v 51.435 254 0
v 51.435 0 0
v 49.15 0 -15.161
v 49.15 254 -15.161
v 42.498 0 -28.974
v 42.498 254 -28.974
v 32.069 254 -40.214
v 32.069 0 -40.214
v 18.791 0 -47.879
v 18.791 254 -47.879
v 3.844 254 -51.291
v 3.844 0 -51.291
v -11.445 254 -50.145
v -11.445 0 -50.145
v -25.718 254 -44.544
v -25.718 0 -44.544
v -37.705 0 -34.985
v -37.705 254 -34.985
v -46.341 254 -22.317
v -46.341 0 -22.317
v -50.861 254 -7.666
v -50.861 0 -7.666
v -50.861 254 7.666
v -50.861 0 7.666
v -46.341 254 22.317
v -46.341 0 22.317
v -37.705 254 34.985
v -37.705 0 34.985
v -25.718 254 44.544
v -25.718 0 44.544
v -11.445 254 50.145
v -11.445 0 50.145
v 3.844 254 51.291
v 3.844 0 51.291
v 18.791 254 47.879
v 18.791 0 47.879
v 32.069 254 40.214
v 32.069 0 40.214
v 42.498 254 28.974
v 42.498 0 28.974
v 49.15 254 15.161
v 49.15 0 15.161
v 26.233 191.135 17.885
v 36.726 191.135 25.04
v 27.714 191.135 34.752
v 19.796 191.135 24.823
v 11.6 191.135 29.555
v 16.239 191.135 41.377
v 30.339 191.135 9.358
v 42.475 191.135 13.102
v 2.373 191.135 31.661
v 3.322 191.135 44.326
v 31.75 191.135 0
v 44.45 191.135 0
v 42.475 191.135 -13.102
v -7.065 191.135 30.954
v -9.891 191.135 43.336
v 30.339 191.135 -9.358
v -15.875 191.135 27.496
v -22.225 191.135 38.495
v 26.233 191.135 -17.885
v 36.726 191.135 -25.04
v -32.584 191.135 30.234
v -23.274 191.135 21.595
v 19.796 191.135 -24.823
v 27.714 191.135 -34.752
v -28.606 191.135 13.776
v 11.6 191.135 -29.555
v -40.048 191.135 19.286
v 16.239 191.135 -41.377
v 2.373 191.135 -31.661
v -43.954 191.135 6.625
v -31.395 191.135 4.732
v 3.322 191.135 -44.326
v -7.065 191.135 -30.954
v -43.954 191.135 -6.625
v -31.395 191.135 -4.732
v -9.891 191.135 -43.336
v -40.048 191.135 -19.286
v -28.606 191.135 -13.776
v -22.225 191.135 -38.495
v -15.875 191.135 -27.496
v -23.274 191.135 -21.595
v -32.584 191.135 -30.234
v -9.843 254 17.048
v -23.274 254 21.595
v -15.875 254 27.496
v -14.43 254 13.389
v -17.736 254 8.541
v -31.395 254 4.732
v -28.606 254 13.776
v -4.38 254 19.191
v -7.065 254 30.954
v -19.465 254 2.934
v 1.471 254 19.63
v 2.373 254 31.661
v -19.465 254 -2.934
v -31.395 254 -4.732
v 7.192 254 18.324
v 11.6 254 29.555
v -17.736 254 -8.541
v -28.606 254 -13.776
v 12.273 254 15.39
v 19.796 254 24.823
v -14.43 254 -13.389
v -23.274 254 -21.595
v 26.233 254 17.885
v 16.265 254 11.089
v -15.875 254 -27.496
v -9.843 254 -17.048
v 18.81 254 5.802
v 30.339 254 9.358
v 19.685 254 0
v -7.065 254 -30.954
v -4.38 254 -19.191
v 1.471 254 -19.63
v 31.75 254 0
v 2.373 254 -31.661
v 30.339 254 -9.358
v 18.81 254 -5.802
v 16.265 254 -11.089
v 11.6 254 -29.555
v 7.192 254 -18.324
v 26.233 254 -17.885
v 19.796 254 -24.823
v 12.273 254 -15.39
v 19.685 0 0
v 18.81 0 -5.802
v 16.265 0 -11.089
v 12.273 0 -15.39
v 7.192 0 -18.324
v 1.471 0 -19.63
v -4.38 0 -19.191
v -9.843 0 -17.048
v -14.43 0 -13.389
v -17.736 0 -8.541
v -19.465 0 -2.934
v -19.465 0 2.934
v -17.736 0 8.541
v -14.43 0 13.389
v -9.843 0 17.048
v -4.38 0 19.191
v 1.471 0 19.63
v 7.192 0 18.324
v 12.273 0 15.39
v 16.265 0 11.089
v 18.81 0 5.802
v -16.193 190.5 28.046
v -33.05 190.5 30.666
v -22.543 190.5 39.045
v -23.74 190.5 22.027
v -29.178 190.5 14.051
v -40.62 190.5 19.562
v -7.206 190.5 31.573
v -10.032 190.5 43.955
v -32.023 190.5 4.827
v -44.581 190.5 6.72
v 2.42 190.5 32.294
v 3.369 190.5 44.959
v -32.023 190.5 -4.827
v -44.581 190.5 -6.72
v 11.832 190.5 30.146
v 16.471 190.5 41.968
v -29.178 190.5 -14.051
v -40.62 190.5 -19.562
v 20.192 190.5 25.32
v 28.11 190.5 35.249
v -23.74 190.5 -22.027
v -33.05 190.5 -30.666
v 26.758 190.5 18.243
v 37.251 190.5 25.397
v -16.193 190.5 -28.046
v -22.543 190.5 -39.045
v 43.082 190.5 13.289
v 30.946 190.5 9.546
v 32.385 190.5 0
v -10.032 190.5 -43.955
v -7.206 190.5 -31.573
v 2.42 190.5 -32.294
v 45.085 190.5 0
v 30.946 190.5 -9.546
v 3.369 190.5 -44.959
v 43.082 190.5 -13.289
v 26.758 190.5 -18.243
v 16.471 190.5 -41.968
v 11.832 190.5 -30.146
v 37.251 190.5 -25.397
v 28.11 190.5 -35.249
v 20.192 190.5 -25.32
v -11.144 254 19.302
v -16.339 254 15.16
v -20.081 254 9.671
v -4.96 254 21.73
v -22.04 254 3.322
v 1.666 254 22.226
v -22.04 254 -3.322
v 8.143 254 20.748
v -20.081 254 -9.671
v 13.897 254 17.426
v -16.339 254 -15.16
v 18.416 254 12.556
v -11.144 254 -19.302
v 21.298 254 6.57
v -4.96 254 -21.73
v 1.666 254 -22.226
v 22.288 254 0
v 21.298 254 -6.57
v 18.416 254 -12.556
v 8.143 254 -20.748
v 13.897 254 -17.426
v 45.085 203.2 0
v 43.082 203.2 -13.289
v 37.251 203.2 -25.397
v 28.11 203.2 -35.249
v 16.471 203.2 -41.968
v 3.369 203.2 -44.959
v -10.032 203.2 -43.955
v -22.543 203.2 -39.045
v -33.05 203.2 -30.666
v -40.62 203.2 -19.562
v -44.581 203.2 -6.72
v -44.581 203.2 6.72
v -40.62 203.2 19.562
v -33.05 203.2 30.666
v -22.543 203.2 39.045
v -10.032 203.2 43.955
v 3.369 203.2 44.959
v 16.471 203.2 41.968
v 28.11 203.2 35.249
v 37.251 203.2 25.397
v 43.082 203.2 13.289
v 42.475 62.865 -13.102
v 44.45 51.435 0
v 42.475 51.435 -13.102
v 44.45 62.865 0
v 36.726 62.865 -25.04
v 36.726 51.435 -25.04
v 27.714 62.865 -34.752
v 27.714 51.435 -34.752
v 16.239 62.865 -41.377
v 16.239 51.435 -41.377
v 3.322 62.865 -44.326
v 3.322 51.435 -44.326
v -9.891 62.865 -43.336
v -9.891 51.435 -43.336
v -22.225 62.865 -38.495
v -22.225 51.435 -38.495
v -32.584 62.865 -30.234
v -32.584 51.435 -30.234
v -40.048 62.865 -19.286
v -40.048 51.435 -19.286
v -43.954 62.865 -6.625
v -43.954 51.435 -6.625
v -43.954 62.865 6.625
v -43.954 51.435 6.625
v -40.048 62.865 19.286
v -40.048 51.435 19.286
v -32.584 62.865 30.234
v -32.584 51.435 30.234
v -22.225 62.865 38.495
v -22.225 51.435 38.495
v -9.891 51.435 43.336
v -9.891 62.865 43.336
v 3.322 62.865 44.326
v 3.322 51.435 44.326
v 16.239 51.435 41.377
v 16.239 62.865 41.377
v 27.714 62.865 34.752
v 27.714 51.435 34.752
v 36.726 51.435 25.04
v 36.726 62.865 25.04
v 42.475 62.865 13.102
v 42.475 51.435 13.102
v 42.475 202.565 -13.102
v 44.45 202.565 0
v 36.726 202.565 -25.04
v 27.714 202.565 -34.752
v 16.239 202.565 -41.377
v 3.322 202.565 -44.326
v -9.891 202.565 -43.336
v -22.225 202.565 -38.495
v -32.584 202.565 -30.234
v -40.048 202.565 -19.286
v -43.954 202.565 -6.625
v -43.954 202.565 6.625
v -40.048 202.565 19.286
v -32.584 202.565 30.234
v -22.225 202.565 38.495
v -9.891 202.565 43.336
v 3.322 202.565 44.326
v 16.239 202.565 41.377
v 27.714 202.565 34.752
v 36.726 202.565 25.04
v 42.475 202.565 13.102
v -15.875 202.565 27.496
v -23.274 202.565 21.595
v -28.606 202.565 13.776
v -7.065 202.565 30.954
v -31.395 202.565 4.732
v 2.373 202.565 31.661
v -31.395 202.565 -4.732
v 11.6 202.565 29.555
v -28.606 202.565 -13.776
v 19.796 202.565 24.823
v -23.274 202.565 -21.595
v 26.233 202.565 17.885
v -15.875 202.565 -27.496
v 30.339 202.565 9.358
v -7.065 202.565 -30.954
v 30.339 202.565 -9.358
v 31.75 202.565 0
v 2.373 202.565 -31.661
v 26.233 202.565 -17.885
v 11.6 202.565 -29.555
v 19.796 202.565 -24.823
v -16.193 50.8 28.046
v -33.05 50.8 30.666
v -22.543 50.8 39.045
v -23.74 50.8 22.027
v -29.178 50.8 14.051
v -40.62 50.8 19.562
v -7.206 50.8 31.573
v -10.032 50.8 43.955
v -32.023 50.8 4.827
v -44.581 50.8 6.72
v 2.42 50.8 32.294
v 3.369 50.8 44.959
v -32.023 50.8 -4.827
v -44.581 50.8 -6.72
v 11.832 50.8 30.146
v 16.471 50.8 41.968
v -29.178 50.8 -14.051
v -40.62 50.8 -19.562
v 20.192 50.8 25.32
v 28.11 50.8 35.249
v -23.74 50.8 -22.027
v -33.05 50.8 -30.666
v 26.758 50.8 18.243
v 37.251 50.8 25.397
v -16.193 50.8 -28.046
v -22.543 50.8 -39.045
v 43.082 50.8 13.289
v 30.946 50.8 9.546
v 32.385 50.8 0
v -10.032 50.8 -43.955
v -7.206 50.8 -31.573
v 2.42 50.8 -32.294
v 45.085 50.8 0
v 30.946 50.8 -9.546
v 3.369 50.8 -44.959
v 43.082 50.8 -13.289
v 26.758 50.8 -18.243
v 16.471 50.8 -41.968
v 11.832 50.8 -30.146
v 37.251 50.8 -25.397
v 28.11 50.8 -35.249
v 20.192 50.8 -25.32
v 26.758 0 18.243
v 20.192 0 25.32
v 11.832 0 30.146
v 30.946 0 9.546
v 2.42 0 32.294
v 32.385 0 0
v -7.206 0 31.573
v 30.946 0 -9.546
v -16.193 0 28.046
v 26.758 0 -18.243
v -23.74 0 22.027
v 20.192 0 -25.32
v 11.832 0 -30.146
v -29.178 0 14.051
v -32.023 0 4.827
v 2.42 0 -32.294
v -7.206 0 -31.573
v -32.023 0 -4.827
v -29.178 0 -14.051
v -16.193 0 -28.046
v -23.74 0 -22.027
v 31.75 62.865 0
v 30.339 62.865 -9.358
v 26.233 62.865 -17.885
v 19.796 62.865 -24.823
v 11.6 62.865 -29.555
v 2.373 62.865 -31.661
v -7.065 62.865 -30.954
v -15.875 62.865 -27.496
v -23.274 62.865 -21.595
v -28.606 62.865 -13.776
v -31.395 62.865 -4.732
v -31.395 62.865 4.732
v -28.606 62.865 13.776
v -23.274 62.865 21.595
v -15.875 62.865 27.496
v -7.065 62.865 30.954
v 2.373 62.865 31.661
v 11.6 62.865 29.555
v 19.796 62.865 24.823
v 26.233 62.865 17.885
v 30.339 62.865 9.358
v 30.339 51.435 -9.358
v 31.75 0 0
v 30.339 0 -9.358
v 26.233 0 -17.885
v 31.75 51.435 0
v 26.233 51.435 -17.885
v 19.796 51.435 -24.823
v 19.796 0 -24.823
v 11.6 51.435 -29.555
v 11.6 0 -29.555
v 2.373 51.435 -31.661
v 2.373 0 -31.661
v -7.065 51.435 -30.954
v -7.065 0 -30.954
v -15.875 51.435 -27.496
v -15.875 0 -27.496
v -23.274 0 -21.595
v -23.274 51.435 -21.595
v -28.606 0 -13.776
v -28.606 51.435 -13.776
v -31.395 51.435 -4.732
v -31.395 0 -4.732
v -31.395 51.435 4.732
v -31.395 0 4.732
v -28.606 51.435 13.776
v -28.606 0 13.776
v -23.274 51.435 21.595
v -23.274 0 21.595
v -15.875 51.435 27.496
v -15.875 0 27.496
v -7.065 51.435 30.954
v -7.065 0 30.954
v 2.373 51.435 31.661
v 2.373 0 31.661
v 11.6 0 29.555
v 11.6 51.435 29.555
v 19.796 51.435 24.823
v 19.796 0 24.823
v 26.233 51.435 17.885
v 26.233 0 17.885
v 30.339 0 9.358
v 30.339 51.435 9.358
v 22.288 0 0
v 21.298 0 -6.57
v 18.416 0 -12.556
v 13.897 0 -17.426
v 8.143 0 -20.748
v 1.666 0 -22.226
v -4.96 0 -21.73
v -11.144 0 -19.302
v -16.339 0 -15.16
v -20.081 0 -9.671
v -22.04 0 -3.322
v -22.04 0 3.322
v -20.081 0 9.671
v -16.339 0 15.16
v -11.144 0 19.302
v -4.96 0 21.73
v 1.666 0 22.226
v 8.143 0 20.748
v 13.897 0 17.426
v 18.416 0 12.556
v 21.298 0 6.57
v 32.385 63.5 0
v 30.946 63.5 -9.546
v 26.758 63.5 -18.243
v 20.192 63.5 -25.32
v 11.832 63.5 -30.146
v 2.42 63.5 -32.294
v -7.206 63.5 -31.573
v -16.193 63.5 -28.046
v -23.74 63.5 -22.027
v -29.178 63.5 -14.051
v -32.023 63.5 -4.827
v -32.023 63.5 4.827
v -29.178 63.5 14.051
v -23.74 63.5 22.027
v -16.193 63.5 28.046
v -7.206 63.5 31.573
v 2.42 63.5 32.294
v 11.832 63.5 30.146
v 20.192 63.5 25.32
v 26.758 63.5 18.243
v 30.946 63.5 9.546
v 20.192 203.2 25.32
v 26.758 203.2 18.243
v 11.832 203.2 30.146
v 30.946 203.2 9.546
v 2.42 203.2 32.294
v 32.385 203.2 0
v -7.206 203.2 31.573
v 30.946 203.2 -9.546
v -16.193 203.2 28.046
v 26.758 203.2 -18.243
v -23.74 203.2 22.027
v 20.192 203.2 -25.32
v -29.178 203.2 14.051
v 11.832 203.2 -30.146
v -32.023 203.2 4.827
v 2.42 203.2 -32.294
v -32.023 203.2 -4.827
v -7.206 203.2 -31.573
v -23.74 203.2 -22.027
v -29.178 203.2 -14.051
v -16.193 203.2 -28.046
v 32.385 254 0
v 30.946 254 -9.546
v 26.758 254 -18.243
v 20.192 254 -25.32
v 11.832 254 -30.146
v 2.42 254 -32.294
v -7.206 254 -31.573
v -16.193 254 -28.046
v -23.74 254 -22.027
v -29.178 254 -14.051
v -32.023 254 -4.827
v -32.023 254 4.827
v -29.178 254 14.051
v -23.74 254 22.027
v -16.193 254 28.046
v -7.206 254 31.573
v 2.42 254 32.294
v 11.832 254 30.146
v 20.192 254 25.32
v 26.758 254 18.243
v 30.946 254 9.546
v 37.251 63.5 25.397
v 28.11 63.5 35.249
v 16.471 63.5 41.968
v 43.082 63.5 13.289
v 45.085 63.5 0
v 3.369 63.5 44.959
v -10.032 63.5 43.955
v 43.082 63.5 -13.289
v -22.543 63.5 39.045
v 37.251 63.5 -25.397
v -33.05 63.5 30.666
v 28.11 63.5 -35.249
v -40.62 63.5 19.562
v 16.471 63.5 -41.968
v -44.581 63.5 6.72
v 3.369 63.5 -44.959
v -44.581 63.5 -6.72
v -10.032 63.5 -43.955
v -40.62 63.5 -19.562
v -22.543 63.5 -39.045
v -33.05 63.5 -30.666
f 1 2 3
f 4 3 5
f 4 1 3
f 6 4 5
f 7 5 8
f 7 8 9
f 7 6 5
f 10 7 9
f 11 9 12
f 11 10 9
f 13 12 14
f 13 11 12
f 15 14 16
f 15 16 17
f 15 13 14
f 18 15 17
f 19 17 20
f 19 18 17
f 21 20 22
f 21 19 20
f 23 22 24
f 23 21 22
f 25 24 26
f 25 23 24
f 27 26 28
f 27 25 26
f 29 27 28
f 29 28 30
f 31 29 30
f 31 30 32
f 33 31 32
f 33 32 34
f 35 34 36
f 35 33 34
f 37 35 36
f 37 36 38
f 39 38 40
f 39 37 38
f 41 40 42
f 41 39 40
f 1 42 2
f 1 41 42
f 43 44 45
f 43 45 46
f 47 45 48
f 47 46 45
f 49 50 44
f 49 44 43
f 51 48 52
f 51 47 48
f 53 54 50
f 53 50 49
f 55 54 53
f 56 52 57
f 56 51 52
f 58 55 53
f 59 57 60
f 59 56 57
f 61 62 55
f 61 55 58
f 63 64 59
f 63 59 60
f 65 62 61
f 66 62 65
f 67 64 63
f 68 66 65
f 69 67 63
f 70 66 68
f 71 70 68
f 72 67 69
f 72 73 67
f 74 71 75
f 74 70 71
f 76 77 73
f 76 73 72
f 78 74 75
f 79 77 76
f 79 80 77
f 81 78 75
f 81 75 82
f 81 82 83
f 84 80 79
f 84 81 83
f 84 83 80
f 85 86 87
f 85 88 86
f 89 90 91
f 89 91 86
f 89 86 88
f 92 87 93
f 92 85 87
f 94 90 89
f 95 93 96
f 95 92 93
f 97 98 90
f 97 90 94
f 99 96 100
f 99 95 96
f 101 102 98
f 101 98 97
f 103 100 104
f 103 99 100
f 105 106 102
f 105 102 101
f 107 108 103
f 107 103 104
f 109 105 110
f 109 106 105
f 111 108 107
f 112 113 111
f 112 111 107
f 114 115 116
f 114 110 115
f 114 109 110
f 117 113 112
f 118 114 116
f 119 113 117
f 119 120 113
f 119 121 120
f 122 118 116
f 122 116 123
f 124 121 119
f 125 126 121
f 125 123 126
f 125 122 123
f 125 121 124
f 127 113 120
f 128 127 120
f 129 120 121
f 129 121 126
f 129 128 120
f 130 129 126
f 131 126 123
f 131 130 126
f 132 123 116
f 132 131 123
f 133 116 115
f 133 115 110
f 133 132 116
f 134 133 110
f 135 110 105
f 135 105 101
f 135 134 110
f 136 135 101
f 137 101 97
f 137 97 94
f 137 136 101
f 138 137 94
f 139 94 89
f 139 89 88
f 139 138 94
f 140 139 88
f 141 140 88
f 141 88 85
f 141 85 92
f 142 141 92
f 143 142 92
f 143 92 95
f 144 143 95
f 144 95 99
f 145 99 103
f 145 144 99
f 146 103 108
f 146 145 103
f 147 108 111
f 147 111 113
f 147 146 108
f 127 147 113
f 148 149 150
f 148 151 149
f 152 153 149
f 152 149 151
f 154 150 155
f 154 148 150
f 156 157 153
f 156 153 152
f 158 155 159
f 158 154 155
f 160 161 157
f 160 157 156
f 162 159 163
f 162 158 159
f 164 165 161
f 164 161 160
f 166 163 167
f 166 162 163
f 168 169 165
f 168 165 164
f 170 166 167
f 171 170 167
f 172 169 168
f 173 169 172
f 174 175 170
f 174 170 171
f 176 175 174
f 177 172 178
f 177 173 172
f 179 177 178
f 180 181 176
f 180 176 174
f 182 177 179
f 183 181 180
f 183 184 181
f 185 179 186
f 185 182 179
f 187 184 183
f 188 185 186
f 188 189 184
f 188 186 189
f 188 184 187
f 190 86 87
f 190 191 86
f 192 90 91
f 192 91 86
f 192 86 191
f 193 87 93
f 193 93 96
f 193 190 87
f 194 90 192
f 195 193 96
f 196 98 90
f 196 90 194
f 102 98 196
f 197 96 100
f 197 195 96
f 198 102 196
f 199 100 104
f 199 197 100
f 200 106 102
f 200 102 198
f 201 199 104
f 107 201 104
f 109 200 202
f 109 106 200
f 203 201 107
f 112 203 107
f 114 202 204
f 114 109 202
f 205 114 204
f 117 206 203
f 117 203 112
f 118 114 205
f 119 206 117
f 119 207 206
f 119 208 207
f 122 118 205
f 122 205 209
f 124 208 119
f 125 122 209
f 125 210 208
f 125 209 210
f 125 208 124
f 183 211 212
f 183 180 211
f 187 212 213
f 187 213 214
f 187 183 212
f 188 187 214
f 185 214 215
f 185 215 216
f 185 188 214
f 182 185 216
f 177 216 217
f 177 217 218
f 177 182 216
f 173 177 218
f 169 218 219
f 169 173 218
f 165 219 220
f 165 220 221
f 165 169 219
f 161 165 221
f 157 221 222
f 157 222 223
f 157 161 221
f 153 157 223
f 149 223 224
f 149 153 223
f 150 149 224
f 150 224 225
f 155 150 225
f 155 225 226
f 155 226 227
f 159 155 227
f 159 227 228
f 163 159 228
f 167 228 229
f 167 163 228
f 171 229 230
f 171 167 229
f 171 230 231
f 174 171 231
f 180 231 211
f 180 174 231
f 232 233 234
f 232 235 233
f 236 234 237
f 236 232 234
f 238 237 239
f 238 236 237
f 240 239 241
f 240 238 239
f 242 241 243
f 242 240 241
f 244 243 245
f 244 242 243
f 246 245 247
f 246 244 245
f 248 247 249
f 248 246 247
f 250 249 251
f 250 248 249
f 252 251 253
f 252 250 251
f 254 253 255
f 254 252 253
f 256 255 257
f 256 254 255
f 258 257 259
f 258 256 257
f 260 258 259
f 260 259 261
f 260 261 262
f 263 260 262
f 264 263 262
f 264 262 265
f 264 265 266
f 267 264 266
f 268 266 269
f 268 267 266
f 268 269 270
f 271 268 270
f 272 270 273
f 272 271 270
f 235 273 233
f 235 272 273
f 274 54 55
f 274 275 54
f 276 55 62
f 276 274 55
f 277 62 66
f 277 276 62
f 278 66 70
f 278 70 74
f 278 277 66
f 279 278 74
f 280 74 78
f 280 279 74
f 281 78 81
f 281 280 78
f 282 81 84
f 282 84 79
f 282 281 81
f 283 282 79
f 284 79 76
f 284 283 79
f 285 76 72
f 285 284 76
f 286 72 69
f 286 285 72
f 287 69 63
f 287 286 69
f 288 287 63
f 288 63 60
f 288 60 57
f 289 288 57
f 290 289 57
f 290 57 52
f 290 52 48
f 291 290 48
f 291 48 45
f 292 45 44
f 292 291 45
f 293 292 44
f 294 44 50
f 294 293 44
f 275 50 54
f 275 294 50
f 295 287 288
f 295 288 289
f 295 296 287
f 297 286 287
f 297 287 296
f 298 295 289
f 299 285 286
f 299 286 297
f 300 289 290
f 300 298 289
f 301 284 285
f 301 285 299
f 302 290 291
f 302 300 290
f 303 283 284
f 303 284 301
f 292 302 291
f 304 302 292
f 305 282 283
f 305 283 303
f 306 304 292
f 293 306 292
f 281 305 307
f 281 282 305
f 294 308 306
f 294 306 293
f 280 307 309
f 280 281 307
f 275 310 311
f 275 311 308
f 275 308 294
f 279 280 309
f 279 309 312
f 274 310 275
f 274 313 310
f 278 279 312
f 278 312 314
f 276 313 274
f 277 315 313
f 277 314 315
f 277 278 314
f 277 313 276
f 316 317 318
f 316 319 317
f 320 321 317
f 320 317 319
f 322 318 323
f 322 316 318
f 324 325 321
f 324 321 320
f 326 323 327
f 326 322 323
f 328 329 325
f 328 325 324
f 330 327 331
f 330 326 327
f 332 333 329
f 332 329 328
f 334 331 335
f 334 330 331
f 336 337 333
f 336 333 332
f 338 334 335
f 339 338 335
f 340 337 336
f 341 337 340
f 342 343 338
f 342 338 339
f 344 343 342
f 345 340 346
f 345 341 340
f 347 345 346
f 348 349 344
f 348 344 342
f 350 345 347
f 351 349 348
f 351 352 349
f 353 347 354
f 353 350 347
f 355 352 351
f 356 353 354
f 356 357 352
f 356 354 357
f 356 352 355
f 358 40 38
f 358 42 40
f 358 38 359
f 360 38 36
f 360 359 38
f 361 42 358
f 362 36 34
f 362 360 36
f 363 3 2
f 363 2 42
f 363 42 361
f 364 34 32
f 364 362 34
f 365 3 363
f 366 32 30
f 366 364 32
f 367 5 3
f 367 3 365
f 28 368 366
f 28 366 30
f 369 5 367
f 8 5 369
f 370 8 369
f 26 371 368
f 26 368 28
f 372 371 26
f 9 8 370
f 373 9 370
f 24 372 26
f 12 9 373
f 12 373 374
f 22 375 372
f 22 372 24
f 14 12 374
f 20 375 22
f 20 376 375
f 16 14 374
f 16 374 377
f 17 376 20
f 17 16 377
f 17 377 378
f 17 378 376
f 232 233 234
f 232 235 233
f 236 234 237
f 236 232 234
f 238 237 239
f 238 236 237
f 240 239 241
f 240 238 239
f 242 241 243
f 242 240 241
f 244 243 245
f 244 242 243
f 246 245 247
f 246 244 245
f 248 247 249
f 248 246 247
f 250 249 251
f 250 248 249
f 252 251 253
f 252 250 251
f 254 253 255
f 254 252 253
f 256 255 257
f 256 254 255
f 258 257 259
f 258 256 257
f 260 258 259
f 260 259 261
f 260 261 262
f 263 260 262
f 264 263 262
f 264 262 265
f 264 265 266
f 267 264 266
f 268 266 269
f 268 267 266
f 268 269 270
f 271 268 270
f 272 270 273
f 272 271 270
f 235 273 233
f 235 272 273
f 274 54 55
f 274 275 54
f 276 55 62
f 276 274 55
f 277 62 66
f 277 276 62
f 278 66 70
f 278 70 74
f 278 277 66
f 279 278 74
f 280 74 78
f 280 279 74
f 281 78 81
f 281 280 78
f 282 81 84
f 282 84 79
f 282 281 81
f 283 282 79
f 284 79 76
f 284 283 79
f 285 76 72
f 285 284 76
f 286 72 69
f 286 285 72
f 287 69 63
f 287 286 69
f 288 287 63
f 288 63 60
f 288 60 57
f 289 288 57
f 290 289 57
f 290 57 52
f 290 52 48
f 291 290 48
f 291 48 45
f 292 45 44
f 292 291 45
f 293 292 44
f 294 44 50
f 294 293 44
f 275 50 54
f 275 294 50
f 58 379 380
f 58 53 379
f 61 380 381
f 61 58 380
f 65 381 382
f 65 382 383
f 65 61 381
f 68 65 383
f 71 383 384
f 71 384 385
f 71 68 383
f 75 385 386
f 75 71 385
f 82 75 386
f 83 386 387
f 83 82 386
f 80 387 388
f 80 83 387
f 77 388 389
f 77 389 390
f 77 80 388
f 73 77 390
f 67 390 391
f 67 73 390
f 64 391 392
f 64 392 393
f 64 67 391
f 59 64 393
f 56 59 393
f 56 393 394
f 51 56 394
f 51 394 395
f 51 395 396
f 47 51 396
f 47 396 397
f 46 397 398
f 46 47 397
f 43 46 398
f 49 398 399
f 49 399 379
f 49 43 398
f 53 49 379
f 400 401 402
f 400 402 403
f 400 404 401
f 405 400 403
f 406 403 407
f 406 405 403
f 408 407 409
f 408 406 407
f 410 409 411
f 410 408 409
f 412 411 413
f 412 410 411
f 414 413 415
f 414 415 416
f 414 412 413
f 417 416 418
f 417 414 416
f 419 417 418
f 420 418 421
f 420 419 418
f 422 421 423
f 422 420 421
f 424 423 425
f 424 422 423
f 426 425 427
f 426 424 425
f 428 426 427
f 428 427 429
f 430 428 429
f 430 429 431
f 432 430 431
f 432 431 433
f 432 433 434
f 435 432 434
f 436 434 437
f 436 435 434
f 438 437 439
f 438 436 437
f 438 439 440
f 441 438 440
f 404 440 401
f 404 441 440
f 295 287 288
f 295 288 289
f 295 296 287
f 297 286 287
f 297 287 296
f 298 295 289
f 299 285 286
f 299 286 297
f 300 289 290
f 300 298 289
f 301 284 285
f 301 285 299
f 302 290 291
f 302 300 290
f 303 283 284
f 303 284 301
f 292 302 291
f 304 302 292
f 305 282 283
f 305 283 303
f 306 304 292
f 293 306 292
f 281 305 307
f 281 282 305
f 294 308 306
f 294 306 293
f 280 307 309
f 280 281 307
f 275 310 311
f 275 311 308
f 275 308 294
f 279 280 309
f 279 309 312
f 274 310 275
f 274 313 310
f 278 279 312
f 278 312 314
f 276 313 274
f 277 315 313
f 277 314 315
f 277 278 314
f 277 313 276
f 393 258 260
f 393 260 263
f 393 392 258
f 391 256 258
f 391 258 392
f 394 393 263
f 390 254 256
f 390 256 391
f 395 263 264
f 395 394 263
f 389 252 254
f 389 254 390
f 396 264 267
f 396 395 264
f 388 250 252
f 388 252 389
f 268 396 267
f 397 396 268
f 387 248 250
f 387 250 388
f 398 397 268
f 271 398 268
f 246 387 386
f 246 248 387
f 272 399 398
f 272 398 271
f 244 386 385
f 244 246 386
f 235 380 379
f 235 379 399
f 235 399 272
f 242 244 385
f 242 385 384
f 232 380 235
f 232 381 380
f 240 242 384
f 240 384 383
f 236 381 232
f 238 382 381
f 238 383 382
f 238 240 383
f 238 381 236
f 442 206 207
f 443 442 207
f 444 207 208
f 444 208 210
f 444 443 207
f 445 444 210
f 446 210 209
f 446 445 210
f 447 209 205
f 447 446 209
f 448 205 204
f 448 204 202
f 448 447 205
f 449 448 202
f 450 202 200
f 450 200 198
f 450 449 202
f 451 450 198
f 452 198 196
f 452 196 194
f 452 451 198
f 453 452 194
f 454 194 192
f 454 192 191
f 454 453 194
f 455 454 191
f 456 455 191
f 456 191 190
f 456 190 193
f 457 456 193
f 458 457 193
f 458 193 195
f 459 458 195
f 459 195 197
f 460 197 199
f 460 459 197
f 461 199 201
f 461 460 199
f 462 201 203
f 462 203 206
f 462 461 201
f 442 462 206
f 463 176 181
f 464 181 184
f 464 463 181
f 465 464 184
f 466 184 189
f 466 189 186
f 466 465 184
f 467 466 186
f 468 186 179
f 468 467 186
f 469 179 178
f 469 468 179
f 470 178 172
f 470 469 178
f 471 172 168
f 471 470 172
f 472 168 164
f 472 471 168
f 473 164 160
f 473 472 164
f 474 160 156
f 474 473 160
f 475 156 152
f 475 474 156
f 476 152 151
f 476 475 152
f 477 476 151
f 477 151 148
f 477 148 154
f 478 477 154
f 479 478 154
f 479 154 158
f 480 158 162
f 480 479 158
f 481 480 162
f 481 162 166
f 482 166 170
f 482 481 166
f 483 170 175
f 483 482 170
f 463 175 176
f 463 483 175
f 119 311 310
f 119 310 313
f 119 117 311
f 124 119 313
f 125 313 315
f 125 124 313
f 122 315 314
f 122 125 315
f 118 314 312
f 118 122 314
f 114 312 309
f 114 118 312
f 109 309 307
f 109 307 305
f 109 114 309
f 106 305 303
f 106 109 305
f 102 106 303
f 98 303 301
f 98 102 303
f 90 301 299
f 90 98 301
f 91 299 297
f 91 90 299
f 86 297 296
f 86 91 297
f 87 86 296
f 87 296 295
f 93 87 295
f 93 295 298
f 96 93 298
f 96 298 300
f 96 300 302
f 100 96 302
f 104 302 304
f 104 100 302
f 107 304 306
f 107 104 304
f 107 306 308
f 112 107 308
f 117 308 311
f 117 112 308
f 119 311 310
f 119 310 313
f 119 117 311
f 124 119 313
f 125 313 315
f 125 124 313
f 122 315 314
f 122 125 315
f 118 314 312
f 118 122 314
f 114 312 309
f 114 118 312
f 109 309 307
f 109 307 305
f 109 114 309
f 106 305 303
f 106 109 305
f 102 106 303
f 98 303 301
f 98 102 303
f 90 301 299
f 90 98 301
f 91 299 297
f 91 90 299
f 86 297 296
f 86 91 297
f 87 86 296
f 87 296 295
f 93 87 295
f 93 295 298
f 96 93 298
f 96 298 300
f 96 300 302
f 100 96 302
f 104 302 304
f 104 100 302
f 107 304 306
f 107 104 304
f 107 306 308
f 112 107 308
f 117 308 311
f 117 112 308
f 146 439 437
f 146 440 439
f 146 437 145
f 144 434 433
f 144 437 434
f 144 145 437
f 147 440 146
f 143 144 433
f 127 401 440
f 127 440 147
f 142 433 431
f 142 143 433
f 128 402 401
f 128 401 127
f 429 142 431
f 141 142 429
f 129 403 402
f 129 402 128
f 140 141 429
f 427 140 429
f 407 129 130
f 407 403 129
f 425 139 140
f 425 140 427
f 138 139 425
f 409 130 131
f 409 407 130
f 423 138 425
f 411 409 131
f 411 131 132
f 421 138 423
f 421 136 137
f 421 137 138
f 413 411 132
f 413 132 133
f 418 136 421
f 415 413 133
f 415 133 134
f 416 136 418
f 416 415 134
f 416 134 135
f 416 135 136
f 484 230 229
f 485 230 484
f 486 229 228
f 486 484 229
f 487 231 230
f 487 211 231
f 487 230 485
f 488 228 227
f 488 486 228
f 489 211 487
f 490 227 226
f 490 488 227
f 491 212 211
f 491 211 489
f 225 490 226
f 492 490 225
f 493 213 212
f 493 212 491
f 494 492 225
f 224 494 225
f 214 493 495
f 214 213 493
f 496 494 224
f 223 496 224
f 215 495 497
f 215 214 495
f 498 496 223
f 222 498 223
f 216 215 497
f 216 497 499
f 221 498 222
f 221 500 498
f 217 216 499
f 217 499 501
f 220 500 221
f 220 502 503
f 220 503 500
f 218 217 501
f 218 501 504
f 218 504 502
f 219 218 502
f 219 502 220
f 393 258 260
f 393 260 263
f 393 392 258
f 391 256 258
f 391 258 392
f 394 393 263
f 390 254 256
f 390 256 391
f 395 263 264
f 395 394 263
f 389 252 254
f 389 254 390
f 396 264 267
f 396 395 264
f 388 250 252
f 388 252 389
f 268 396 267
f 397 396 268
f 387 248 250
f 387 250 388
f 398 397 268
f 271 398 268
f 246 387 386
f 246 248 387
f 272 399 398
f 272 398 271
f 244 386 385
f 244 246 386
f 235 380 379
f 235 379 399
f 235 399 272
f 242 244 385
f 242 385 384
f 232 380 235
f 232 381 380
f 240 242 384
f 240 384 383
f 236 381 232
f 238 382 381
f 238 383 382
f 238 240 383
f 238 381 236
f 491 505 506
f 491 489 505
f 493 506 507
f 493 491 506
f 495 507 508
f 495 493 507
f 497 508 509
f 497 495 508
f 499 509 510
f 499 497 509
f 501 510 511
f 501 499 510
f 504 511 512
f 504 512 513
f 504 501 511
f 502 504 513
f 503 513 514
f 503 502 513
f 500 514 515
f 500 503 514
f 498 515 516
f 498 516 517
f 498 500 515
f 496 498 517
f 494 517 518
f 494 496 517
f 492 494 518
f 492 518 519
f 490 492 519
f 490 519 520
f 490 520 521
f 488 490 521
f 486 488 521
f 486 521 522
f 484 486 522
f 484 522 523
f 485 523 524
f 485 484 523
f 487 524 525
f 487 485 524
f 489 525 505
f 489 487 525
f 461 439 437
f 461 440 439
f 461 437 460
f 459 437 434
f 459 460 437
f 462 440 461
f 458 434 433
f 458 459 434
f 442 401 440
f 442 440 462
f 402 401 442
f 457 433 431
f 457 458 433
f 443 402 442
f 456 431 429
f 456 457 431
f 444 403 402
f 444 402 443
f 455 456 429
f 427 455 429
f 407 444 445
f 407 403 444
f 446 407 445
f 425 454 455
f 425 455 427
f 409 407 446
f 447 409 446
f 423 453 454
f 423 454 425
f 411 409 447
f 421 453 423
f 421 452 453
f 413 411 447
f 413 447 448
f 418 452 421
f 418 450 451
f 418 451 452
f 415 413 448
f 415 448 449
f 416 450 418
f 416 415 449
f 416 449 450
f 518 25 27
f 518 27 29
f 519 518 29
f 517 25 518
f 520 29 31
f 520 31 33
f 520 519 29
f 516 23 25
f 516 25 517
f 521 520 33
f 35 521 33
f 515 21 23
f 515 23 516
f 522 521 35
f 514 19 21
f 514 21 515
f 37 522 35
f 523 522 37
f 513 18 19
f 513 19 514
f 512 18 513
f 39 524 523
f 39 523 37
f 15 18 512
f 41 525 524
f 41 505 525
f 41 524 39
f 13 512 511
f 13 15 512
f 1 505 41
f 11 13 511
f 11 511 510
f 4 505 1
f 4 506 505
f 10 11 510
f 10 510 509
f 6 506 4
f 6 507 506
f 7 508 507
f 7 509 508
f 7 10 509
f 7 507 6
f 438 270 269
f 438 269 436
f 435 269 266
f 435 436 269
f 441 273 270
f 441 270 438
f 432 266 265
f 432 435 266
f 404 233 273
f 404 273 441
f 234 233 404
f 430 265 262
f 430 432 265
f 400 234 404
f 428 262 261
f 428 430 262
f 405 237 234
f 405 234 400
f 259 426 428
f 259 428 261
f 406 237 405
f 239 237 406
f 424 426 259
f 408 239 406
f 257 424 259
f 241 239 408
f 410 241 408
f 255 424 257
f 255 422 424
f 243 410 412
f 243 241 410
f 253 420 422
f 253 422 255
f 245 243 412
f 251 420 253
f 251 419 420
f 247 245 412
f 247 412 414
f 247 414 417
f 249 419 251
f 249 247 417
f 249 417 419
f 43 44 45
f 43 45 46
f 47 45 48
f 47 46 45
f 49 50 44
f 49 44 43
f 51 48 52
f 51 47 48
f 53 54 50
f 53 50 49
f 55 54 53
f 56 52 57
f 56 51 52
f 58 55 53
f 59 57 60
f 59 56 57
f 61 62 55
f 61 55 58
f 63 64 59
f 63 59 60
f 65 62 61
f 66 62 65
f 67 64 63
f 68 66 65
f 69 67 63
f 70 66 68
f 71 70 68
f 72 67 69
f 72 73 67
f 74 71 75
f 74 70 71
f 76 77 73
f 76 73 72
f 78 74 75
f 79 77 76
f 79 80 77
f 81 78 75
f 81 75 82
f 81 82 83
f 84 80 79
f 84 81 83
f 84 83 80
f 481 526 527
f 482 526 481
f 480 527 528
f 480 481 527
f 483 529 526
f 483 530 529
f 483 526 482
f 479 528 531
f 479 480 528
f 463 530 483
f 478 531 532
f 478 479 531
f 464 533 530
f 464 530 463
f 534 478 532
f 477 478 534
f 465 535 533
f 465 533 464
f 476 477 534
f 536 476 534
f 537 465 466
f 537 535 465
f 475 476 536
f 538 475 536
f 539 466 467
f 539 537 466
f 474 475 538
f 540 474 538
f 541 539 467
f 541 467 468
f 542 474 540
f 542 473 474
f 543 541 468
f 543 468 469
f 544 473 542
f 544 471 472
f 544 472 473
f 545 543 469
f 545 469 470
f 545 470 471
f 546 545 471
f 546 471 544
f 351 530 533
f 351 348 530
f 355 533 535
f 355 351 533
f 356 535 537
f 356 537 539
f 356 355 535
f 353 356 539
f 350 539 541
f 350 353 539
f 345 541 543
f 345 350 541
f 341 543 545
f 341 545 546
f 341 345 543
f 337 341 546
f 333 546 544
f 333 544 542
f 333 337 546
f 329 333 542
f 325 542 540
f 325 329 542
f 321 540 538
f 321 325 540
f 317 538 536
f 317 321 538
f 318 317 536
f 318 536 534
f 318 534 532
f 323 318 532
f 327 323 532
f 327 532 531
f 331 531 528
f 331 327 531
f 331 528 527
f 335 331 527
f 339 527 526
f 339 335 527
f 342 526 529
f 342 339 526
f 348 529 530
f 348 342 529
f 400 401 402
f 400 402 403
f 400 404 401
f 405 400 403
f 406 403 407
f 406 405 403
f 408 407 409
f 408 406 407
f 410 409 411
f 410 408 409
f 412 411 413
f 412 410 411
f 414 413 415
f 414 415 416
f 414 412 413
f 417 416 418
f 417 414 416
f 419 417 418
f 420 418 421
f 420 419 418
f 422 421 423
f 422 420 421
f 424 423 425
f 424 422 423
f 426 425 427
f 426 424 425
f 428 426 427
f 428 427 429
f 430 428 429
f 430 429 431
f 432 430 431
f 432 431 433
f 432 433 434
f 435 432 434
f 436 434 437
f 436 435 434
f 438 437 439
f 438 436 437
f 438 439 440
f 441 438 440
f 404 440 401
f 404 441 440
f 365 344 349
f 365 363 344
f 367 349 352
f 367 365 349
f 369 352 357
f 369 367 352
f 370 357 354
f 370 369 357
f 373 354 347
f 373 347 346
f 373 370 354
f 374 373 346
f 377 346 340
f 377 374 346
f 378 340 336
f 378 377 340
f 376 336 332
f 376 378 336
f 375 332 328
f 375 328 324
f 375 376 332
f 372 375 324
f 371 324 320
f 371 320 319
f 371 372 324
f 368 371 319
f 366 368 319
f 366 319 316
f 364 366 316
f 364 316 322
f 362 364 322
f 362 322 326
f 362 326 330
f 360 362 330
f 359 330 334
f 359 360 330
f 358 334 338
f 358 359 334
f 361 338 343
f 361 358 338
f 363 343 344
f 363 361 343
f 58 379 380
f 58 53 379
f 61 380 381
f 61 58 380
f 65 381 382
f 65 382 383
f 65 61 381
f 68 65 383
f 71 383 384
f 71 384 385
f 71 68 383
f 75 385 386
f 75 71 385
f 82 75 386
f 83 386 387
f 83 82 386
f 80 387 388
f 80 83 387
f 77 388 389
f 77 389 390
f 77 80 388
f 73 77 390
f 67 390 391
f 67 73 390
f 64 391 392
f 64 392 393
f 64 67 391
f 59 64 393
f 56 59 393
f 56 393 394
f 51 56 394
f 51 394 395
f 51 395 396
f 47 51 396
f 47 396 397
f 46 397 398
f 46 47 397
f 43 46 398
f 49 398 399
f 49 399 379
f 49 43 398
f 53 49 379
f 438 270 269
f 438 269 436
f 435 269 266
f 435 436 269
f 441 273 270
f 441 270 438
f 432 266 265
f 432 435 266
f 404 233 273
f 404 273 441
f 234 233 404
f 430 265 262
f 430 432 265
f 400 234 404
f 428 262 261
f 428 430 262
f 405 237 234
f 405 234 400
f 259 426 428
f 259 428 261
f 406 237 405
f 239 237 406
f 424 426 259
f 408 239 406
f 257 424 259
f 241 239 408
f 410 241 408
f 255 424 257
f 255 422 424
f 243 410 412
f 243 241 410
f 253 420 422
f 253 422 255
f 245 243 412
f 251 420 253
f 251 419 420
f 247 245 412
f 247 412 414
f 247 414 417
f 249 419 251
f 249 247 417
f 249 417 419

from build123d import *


with BuildPart() as f1:
    # F0 (on Top) → F1 (revolve)
    with BuildSketch(Plane.XY):
        Polygon((51.435, 254), (32.385, 254), (32.385, 203.2), (45.085, 203.2), (45.085, 190.5), (32.385, 190.5), (32.385, 63.5), (45.085, 63.5), (45.085, 50.8), (32.385, 50.8), (32.385, 0), (51.435, 0), align=None)
    revolve(axis=Axis((0, 127, 0), (0, 1, 0)))


with BuildPart() as f3:
    # F2 (on Top) → F3 (revolve)
    with BuildSketch(Plane.XY):
        Polygon((31.75, 254), (22.2885, 254), (22.2885, 127), (22.2885, 0), (31.75, 0), (31.75, 51.435), (44.45, 51.435), (44.45, 62.865), (31.75, 62.865), (31.75, 127), (31.75, 191.135), (44.45, 191.135), (44.45, 202.565), (31.75, 202.565), align=None)
    revolve(axis=Axis((0, 127, 0), (0, 1, 0)))


with BuildPart() as f5:
    # F4 (on Top) → F5 (revolve)
    with BuildSketch(Plane.XY):
        Polygon((31.75, 254), (19.685, 254), (19.685, 127), (19.685, 0), (31.75, 0), (31.75, 51.435), (44.45, 51.435), (44.45, 62.865), (31.75, 62.865), (31.75, 127), (31.75, 191.135), (44.45, 191.135), (44.45, 202.565), (31.75, 202.565), align=None)
    revolve(axis=Axis((0, 127, 0), (0, 1, 0)))


solid = Compound([f1.part, f3.part, f5.part])
